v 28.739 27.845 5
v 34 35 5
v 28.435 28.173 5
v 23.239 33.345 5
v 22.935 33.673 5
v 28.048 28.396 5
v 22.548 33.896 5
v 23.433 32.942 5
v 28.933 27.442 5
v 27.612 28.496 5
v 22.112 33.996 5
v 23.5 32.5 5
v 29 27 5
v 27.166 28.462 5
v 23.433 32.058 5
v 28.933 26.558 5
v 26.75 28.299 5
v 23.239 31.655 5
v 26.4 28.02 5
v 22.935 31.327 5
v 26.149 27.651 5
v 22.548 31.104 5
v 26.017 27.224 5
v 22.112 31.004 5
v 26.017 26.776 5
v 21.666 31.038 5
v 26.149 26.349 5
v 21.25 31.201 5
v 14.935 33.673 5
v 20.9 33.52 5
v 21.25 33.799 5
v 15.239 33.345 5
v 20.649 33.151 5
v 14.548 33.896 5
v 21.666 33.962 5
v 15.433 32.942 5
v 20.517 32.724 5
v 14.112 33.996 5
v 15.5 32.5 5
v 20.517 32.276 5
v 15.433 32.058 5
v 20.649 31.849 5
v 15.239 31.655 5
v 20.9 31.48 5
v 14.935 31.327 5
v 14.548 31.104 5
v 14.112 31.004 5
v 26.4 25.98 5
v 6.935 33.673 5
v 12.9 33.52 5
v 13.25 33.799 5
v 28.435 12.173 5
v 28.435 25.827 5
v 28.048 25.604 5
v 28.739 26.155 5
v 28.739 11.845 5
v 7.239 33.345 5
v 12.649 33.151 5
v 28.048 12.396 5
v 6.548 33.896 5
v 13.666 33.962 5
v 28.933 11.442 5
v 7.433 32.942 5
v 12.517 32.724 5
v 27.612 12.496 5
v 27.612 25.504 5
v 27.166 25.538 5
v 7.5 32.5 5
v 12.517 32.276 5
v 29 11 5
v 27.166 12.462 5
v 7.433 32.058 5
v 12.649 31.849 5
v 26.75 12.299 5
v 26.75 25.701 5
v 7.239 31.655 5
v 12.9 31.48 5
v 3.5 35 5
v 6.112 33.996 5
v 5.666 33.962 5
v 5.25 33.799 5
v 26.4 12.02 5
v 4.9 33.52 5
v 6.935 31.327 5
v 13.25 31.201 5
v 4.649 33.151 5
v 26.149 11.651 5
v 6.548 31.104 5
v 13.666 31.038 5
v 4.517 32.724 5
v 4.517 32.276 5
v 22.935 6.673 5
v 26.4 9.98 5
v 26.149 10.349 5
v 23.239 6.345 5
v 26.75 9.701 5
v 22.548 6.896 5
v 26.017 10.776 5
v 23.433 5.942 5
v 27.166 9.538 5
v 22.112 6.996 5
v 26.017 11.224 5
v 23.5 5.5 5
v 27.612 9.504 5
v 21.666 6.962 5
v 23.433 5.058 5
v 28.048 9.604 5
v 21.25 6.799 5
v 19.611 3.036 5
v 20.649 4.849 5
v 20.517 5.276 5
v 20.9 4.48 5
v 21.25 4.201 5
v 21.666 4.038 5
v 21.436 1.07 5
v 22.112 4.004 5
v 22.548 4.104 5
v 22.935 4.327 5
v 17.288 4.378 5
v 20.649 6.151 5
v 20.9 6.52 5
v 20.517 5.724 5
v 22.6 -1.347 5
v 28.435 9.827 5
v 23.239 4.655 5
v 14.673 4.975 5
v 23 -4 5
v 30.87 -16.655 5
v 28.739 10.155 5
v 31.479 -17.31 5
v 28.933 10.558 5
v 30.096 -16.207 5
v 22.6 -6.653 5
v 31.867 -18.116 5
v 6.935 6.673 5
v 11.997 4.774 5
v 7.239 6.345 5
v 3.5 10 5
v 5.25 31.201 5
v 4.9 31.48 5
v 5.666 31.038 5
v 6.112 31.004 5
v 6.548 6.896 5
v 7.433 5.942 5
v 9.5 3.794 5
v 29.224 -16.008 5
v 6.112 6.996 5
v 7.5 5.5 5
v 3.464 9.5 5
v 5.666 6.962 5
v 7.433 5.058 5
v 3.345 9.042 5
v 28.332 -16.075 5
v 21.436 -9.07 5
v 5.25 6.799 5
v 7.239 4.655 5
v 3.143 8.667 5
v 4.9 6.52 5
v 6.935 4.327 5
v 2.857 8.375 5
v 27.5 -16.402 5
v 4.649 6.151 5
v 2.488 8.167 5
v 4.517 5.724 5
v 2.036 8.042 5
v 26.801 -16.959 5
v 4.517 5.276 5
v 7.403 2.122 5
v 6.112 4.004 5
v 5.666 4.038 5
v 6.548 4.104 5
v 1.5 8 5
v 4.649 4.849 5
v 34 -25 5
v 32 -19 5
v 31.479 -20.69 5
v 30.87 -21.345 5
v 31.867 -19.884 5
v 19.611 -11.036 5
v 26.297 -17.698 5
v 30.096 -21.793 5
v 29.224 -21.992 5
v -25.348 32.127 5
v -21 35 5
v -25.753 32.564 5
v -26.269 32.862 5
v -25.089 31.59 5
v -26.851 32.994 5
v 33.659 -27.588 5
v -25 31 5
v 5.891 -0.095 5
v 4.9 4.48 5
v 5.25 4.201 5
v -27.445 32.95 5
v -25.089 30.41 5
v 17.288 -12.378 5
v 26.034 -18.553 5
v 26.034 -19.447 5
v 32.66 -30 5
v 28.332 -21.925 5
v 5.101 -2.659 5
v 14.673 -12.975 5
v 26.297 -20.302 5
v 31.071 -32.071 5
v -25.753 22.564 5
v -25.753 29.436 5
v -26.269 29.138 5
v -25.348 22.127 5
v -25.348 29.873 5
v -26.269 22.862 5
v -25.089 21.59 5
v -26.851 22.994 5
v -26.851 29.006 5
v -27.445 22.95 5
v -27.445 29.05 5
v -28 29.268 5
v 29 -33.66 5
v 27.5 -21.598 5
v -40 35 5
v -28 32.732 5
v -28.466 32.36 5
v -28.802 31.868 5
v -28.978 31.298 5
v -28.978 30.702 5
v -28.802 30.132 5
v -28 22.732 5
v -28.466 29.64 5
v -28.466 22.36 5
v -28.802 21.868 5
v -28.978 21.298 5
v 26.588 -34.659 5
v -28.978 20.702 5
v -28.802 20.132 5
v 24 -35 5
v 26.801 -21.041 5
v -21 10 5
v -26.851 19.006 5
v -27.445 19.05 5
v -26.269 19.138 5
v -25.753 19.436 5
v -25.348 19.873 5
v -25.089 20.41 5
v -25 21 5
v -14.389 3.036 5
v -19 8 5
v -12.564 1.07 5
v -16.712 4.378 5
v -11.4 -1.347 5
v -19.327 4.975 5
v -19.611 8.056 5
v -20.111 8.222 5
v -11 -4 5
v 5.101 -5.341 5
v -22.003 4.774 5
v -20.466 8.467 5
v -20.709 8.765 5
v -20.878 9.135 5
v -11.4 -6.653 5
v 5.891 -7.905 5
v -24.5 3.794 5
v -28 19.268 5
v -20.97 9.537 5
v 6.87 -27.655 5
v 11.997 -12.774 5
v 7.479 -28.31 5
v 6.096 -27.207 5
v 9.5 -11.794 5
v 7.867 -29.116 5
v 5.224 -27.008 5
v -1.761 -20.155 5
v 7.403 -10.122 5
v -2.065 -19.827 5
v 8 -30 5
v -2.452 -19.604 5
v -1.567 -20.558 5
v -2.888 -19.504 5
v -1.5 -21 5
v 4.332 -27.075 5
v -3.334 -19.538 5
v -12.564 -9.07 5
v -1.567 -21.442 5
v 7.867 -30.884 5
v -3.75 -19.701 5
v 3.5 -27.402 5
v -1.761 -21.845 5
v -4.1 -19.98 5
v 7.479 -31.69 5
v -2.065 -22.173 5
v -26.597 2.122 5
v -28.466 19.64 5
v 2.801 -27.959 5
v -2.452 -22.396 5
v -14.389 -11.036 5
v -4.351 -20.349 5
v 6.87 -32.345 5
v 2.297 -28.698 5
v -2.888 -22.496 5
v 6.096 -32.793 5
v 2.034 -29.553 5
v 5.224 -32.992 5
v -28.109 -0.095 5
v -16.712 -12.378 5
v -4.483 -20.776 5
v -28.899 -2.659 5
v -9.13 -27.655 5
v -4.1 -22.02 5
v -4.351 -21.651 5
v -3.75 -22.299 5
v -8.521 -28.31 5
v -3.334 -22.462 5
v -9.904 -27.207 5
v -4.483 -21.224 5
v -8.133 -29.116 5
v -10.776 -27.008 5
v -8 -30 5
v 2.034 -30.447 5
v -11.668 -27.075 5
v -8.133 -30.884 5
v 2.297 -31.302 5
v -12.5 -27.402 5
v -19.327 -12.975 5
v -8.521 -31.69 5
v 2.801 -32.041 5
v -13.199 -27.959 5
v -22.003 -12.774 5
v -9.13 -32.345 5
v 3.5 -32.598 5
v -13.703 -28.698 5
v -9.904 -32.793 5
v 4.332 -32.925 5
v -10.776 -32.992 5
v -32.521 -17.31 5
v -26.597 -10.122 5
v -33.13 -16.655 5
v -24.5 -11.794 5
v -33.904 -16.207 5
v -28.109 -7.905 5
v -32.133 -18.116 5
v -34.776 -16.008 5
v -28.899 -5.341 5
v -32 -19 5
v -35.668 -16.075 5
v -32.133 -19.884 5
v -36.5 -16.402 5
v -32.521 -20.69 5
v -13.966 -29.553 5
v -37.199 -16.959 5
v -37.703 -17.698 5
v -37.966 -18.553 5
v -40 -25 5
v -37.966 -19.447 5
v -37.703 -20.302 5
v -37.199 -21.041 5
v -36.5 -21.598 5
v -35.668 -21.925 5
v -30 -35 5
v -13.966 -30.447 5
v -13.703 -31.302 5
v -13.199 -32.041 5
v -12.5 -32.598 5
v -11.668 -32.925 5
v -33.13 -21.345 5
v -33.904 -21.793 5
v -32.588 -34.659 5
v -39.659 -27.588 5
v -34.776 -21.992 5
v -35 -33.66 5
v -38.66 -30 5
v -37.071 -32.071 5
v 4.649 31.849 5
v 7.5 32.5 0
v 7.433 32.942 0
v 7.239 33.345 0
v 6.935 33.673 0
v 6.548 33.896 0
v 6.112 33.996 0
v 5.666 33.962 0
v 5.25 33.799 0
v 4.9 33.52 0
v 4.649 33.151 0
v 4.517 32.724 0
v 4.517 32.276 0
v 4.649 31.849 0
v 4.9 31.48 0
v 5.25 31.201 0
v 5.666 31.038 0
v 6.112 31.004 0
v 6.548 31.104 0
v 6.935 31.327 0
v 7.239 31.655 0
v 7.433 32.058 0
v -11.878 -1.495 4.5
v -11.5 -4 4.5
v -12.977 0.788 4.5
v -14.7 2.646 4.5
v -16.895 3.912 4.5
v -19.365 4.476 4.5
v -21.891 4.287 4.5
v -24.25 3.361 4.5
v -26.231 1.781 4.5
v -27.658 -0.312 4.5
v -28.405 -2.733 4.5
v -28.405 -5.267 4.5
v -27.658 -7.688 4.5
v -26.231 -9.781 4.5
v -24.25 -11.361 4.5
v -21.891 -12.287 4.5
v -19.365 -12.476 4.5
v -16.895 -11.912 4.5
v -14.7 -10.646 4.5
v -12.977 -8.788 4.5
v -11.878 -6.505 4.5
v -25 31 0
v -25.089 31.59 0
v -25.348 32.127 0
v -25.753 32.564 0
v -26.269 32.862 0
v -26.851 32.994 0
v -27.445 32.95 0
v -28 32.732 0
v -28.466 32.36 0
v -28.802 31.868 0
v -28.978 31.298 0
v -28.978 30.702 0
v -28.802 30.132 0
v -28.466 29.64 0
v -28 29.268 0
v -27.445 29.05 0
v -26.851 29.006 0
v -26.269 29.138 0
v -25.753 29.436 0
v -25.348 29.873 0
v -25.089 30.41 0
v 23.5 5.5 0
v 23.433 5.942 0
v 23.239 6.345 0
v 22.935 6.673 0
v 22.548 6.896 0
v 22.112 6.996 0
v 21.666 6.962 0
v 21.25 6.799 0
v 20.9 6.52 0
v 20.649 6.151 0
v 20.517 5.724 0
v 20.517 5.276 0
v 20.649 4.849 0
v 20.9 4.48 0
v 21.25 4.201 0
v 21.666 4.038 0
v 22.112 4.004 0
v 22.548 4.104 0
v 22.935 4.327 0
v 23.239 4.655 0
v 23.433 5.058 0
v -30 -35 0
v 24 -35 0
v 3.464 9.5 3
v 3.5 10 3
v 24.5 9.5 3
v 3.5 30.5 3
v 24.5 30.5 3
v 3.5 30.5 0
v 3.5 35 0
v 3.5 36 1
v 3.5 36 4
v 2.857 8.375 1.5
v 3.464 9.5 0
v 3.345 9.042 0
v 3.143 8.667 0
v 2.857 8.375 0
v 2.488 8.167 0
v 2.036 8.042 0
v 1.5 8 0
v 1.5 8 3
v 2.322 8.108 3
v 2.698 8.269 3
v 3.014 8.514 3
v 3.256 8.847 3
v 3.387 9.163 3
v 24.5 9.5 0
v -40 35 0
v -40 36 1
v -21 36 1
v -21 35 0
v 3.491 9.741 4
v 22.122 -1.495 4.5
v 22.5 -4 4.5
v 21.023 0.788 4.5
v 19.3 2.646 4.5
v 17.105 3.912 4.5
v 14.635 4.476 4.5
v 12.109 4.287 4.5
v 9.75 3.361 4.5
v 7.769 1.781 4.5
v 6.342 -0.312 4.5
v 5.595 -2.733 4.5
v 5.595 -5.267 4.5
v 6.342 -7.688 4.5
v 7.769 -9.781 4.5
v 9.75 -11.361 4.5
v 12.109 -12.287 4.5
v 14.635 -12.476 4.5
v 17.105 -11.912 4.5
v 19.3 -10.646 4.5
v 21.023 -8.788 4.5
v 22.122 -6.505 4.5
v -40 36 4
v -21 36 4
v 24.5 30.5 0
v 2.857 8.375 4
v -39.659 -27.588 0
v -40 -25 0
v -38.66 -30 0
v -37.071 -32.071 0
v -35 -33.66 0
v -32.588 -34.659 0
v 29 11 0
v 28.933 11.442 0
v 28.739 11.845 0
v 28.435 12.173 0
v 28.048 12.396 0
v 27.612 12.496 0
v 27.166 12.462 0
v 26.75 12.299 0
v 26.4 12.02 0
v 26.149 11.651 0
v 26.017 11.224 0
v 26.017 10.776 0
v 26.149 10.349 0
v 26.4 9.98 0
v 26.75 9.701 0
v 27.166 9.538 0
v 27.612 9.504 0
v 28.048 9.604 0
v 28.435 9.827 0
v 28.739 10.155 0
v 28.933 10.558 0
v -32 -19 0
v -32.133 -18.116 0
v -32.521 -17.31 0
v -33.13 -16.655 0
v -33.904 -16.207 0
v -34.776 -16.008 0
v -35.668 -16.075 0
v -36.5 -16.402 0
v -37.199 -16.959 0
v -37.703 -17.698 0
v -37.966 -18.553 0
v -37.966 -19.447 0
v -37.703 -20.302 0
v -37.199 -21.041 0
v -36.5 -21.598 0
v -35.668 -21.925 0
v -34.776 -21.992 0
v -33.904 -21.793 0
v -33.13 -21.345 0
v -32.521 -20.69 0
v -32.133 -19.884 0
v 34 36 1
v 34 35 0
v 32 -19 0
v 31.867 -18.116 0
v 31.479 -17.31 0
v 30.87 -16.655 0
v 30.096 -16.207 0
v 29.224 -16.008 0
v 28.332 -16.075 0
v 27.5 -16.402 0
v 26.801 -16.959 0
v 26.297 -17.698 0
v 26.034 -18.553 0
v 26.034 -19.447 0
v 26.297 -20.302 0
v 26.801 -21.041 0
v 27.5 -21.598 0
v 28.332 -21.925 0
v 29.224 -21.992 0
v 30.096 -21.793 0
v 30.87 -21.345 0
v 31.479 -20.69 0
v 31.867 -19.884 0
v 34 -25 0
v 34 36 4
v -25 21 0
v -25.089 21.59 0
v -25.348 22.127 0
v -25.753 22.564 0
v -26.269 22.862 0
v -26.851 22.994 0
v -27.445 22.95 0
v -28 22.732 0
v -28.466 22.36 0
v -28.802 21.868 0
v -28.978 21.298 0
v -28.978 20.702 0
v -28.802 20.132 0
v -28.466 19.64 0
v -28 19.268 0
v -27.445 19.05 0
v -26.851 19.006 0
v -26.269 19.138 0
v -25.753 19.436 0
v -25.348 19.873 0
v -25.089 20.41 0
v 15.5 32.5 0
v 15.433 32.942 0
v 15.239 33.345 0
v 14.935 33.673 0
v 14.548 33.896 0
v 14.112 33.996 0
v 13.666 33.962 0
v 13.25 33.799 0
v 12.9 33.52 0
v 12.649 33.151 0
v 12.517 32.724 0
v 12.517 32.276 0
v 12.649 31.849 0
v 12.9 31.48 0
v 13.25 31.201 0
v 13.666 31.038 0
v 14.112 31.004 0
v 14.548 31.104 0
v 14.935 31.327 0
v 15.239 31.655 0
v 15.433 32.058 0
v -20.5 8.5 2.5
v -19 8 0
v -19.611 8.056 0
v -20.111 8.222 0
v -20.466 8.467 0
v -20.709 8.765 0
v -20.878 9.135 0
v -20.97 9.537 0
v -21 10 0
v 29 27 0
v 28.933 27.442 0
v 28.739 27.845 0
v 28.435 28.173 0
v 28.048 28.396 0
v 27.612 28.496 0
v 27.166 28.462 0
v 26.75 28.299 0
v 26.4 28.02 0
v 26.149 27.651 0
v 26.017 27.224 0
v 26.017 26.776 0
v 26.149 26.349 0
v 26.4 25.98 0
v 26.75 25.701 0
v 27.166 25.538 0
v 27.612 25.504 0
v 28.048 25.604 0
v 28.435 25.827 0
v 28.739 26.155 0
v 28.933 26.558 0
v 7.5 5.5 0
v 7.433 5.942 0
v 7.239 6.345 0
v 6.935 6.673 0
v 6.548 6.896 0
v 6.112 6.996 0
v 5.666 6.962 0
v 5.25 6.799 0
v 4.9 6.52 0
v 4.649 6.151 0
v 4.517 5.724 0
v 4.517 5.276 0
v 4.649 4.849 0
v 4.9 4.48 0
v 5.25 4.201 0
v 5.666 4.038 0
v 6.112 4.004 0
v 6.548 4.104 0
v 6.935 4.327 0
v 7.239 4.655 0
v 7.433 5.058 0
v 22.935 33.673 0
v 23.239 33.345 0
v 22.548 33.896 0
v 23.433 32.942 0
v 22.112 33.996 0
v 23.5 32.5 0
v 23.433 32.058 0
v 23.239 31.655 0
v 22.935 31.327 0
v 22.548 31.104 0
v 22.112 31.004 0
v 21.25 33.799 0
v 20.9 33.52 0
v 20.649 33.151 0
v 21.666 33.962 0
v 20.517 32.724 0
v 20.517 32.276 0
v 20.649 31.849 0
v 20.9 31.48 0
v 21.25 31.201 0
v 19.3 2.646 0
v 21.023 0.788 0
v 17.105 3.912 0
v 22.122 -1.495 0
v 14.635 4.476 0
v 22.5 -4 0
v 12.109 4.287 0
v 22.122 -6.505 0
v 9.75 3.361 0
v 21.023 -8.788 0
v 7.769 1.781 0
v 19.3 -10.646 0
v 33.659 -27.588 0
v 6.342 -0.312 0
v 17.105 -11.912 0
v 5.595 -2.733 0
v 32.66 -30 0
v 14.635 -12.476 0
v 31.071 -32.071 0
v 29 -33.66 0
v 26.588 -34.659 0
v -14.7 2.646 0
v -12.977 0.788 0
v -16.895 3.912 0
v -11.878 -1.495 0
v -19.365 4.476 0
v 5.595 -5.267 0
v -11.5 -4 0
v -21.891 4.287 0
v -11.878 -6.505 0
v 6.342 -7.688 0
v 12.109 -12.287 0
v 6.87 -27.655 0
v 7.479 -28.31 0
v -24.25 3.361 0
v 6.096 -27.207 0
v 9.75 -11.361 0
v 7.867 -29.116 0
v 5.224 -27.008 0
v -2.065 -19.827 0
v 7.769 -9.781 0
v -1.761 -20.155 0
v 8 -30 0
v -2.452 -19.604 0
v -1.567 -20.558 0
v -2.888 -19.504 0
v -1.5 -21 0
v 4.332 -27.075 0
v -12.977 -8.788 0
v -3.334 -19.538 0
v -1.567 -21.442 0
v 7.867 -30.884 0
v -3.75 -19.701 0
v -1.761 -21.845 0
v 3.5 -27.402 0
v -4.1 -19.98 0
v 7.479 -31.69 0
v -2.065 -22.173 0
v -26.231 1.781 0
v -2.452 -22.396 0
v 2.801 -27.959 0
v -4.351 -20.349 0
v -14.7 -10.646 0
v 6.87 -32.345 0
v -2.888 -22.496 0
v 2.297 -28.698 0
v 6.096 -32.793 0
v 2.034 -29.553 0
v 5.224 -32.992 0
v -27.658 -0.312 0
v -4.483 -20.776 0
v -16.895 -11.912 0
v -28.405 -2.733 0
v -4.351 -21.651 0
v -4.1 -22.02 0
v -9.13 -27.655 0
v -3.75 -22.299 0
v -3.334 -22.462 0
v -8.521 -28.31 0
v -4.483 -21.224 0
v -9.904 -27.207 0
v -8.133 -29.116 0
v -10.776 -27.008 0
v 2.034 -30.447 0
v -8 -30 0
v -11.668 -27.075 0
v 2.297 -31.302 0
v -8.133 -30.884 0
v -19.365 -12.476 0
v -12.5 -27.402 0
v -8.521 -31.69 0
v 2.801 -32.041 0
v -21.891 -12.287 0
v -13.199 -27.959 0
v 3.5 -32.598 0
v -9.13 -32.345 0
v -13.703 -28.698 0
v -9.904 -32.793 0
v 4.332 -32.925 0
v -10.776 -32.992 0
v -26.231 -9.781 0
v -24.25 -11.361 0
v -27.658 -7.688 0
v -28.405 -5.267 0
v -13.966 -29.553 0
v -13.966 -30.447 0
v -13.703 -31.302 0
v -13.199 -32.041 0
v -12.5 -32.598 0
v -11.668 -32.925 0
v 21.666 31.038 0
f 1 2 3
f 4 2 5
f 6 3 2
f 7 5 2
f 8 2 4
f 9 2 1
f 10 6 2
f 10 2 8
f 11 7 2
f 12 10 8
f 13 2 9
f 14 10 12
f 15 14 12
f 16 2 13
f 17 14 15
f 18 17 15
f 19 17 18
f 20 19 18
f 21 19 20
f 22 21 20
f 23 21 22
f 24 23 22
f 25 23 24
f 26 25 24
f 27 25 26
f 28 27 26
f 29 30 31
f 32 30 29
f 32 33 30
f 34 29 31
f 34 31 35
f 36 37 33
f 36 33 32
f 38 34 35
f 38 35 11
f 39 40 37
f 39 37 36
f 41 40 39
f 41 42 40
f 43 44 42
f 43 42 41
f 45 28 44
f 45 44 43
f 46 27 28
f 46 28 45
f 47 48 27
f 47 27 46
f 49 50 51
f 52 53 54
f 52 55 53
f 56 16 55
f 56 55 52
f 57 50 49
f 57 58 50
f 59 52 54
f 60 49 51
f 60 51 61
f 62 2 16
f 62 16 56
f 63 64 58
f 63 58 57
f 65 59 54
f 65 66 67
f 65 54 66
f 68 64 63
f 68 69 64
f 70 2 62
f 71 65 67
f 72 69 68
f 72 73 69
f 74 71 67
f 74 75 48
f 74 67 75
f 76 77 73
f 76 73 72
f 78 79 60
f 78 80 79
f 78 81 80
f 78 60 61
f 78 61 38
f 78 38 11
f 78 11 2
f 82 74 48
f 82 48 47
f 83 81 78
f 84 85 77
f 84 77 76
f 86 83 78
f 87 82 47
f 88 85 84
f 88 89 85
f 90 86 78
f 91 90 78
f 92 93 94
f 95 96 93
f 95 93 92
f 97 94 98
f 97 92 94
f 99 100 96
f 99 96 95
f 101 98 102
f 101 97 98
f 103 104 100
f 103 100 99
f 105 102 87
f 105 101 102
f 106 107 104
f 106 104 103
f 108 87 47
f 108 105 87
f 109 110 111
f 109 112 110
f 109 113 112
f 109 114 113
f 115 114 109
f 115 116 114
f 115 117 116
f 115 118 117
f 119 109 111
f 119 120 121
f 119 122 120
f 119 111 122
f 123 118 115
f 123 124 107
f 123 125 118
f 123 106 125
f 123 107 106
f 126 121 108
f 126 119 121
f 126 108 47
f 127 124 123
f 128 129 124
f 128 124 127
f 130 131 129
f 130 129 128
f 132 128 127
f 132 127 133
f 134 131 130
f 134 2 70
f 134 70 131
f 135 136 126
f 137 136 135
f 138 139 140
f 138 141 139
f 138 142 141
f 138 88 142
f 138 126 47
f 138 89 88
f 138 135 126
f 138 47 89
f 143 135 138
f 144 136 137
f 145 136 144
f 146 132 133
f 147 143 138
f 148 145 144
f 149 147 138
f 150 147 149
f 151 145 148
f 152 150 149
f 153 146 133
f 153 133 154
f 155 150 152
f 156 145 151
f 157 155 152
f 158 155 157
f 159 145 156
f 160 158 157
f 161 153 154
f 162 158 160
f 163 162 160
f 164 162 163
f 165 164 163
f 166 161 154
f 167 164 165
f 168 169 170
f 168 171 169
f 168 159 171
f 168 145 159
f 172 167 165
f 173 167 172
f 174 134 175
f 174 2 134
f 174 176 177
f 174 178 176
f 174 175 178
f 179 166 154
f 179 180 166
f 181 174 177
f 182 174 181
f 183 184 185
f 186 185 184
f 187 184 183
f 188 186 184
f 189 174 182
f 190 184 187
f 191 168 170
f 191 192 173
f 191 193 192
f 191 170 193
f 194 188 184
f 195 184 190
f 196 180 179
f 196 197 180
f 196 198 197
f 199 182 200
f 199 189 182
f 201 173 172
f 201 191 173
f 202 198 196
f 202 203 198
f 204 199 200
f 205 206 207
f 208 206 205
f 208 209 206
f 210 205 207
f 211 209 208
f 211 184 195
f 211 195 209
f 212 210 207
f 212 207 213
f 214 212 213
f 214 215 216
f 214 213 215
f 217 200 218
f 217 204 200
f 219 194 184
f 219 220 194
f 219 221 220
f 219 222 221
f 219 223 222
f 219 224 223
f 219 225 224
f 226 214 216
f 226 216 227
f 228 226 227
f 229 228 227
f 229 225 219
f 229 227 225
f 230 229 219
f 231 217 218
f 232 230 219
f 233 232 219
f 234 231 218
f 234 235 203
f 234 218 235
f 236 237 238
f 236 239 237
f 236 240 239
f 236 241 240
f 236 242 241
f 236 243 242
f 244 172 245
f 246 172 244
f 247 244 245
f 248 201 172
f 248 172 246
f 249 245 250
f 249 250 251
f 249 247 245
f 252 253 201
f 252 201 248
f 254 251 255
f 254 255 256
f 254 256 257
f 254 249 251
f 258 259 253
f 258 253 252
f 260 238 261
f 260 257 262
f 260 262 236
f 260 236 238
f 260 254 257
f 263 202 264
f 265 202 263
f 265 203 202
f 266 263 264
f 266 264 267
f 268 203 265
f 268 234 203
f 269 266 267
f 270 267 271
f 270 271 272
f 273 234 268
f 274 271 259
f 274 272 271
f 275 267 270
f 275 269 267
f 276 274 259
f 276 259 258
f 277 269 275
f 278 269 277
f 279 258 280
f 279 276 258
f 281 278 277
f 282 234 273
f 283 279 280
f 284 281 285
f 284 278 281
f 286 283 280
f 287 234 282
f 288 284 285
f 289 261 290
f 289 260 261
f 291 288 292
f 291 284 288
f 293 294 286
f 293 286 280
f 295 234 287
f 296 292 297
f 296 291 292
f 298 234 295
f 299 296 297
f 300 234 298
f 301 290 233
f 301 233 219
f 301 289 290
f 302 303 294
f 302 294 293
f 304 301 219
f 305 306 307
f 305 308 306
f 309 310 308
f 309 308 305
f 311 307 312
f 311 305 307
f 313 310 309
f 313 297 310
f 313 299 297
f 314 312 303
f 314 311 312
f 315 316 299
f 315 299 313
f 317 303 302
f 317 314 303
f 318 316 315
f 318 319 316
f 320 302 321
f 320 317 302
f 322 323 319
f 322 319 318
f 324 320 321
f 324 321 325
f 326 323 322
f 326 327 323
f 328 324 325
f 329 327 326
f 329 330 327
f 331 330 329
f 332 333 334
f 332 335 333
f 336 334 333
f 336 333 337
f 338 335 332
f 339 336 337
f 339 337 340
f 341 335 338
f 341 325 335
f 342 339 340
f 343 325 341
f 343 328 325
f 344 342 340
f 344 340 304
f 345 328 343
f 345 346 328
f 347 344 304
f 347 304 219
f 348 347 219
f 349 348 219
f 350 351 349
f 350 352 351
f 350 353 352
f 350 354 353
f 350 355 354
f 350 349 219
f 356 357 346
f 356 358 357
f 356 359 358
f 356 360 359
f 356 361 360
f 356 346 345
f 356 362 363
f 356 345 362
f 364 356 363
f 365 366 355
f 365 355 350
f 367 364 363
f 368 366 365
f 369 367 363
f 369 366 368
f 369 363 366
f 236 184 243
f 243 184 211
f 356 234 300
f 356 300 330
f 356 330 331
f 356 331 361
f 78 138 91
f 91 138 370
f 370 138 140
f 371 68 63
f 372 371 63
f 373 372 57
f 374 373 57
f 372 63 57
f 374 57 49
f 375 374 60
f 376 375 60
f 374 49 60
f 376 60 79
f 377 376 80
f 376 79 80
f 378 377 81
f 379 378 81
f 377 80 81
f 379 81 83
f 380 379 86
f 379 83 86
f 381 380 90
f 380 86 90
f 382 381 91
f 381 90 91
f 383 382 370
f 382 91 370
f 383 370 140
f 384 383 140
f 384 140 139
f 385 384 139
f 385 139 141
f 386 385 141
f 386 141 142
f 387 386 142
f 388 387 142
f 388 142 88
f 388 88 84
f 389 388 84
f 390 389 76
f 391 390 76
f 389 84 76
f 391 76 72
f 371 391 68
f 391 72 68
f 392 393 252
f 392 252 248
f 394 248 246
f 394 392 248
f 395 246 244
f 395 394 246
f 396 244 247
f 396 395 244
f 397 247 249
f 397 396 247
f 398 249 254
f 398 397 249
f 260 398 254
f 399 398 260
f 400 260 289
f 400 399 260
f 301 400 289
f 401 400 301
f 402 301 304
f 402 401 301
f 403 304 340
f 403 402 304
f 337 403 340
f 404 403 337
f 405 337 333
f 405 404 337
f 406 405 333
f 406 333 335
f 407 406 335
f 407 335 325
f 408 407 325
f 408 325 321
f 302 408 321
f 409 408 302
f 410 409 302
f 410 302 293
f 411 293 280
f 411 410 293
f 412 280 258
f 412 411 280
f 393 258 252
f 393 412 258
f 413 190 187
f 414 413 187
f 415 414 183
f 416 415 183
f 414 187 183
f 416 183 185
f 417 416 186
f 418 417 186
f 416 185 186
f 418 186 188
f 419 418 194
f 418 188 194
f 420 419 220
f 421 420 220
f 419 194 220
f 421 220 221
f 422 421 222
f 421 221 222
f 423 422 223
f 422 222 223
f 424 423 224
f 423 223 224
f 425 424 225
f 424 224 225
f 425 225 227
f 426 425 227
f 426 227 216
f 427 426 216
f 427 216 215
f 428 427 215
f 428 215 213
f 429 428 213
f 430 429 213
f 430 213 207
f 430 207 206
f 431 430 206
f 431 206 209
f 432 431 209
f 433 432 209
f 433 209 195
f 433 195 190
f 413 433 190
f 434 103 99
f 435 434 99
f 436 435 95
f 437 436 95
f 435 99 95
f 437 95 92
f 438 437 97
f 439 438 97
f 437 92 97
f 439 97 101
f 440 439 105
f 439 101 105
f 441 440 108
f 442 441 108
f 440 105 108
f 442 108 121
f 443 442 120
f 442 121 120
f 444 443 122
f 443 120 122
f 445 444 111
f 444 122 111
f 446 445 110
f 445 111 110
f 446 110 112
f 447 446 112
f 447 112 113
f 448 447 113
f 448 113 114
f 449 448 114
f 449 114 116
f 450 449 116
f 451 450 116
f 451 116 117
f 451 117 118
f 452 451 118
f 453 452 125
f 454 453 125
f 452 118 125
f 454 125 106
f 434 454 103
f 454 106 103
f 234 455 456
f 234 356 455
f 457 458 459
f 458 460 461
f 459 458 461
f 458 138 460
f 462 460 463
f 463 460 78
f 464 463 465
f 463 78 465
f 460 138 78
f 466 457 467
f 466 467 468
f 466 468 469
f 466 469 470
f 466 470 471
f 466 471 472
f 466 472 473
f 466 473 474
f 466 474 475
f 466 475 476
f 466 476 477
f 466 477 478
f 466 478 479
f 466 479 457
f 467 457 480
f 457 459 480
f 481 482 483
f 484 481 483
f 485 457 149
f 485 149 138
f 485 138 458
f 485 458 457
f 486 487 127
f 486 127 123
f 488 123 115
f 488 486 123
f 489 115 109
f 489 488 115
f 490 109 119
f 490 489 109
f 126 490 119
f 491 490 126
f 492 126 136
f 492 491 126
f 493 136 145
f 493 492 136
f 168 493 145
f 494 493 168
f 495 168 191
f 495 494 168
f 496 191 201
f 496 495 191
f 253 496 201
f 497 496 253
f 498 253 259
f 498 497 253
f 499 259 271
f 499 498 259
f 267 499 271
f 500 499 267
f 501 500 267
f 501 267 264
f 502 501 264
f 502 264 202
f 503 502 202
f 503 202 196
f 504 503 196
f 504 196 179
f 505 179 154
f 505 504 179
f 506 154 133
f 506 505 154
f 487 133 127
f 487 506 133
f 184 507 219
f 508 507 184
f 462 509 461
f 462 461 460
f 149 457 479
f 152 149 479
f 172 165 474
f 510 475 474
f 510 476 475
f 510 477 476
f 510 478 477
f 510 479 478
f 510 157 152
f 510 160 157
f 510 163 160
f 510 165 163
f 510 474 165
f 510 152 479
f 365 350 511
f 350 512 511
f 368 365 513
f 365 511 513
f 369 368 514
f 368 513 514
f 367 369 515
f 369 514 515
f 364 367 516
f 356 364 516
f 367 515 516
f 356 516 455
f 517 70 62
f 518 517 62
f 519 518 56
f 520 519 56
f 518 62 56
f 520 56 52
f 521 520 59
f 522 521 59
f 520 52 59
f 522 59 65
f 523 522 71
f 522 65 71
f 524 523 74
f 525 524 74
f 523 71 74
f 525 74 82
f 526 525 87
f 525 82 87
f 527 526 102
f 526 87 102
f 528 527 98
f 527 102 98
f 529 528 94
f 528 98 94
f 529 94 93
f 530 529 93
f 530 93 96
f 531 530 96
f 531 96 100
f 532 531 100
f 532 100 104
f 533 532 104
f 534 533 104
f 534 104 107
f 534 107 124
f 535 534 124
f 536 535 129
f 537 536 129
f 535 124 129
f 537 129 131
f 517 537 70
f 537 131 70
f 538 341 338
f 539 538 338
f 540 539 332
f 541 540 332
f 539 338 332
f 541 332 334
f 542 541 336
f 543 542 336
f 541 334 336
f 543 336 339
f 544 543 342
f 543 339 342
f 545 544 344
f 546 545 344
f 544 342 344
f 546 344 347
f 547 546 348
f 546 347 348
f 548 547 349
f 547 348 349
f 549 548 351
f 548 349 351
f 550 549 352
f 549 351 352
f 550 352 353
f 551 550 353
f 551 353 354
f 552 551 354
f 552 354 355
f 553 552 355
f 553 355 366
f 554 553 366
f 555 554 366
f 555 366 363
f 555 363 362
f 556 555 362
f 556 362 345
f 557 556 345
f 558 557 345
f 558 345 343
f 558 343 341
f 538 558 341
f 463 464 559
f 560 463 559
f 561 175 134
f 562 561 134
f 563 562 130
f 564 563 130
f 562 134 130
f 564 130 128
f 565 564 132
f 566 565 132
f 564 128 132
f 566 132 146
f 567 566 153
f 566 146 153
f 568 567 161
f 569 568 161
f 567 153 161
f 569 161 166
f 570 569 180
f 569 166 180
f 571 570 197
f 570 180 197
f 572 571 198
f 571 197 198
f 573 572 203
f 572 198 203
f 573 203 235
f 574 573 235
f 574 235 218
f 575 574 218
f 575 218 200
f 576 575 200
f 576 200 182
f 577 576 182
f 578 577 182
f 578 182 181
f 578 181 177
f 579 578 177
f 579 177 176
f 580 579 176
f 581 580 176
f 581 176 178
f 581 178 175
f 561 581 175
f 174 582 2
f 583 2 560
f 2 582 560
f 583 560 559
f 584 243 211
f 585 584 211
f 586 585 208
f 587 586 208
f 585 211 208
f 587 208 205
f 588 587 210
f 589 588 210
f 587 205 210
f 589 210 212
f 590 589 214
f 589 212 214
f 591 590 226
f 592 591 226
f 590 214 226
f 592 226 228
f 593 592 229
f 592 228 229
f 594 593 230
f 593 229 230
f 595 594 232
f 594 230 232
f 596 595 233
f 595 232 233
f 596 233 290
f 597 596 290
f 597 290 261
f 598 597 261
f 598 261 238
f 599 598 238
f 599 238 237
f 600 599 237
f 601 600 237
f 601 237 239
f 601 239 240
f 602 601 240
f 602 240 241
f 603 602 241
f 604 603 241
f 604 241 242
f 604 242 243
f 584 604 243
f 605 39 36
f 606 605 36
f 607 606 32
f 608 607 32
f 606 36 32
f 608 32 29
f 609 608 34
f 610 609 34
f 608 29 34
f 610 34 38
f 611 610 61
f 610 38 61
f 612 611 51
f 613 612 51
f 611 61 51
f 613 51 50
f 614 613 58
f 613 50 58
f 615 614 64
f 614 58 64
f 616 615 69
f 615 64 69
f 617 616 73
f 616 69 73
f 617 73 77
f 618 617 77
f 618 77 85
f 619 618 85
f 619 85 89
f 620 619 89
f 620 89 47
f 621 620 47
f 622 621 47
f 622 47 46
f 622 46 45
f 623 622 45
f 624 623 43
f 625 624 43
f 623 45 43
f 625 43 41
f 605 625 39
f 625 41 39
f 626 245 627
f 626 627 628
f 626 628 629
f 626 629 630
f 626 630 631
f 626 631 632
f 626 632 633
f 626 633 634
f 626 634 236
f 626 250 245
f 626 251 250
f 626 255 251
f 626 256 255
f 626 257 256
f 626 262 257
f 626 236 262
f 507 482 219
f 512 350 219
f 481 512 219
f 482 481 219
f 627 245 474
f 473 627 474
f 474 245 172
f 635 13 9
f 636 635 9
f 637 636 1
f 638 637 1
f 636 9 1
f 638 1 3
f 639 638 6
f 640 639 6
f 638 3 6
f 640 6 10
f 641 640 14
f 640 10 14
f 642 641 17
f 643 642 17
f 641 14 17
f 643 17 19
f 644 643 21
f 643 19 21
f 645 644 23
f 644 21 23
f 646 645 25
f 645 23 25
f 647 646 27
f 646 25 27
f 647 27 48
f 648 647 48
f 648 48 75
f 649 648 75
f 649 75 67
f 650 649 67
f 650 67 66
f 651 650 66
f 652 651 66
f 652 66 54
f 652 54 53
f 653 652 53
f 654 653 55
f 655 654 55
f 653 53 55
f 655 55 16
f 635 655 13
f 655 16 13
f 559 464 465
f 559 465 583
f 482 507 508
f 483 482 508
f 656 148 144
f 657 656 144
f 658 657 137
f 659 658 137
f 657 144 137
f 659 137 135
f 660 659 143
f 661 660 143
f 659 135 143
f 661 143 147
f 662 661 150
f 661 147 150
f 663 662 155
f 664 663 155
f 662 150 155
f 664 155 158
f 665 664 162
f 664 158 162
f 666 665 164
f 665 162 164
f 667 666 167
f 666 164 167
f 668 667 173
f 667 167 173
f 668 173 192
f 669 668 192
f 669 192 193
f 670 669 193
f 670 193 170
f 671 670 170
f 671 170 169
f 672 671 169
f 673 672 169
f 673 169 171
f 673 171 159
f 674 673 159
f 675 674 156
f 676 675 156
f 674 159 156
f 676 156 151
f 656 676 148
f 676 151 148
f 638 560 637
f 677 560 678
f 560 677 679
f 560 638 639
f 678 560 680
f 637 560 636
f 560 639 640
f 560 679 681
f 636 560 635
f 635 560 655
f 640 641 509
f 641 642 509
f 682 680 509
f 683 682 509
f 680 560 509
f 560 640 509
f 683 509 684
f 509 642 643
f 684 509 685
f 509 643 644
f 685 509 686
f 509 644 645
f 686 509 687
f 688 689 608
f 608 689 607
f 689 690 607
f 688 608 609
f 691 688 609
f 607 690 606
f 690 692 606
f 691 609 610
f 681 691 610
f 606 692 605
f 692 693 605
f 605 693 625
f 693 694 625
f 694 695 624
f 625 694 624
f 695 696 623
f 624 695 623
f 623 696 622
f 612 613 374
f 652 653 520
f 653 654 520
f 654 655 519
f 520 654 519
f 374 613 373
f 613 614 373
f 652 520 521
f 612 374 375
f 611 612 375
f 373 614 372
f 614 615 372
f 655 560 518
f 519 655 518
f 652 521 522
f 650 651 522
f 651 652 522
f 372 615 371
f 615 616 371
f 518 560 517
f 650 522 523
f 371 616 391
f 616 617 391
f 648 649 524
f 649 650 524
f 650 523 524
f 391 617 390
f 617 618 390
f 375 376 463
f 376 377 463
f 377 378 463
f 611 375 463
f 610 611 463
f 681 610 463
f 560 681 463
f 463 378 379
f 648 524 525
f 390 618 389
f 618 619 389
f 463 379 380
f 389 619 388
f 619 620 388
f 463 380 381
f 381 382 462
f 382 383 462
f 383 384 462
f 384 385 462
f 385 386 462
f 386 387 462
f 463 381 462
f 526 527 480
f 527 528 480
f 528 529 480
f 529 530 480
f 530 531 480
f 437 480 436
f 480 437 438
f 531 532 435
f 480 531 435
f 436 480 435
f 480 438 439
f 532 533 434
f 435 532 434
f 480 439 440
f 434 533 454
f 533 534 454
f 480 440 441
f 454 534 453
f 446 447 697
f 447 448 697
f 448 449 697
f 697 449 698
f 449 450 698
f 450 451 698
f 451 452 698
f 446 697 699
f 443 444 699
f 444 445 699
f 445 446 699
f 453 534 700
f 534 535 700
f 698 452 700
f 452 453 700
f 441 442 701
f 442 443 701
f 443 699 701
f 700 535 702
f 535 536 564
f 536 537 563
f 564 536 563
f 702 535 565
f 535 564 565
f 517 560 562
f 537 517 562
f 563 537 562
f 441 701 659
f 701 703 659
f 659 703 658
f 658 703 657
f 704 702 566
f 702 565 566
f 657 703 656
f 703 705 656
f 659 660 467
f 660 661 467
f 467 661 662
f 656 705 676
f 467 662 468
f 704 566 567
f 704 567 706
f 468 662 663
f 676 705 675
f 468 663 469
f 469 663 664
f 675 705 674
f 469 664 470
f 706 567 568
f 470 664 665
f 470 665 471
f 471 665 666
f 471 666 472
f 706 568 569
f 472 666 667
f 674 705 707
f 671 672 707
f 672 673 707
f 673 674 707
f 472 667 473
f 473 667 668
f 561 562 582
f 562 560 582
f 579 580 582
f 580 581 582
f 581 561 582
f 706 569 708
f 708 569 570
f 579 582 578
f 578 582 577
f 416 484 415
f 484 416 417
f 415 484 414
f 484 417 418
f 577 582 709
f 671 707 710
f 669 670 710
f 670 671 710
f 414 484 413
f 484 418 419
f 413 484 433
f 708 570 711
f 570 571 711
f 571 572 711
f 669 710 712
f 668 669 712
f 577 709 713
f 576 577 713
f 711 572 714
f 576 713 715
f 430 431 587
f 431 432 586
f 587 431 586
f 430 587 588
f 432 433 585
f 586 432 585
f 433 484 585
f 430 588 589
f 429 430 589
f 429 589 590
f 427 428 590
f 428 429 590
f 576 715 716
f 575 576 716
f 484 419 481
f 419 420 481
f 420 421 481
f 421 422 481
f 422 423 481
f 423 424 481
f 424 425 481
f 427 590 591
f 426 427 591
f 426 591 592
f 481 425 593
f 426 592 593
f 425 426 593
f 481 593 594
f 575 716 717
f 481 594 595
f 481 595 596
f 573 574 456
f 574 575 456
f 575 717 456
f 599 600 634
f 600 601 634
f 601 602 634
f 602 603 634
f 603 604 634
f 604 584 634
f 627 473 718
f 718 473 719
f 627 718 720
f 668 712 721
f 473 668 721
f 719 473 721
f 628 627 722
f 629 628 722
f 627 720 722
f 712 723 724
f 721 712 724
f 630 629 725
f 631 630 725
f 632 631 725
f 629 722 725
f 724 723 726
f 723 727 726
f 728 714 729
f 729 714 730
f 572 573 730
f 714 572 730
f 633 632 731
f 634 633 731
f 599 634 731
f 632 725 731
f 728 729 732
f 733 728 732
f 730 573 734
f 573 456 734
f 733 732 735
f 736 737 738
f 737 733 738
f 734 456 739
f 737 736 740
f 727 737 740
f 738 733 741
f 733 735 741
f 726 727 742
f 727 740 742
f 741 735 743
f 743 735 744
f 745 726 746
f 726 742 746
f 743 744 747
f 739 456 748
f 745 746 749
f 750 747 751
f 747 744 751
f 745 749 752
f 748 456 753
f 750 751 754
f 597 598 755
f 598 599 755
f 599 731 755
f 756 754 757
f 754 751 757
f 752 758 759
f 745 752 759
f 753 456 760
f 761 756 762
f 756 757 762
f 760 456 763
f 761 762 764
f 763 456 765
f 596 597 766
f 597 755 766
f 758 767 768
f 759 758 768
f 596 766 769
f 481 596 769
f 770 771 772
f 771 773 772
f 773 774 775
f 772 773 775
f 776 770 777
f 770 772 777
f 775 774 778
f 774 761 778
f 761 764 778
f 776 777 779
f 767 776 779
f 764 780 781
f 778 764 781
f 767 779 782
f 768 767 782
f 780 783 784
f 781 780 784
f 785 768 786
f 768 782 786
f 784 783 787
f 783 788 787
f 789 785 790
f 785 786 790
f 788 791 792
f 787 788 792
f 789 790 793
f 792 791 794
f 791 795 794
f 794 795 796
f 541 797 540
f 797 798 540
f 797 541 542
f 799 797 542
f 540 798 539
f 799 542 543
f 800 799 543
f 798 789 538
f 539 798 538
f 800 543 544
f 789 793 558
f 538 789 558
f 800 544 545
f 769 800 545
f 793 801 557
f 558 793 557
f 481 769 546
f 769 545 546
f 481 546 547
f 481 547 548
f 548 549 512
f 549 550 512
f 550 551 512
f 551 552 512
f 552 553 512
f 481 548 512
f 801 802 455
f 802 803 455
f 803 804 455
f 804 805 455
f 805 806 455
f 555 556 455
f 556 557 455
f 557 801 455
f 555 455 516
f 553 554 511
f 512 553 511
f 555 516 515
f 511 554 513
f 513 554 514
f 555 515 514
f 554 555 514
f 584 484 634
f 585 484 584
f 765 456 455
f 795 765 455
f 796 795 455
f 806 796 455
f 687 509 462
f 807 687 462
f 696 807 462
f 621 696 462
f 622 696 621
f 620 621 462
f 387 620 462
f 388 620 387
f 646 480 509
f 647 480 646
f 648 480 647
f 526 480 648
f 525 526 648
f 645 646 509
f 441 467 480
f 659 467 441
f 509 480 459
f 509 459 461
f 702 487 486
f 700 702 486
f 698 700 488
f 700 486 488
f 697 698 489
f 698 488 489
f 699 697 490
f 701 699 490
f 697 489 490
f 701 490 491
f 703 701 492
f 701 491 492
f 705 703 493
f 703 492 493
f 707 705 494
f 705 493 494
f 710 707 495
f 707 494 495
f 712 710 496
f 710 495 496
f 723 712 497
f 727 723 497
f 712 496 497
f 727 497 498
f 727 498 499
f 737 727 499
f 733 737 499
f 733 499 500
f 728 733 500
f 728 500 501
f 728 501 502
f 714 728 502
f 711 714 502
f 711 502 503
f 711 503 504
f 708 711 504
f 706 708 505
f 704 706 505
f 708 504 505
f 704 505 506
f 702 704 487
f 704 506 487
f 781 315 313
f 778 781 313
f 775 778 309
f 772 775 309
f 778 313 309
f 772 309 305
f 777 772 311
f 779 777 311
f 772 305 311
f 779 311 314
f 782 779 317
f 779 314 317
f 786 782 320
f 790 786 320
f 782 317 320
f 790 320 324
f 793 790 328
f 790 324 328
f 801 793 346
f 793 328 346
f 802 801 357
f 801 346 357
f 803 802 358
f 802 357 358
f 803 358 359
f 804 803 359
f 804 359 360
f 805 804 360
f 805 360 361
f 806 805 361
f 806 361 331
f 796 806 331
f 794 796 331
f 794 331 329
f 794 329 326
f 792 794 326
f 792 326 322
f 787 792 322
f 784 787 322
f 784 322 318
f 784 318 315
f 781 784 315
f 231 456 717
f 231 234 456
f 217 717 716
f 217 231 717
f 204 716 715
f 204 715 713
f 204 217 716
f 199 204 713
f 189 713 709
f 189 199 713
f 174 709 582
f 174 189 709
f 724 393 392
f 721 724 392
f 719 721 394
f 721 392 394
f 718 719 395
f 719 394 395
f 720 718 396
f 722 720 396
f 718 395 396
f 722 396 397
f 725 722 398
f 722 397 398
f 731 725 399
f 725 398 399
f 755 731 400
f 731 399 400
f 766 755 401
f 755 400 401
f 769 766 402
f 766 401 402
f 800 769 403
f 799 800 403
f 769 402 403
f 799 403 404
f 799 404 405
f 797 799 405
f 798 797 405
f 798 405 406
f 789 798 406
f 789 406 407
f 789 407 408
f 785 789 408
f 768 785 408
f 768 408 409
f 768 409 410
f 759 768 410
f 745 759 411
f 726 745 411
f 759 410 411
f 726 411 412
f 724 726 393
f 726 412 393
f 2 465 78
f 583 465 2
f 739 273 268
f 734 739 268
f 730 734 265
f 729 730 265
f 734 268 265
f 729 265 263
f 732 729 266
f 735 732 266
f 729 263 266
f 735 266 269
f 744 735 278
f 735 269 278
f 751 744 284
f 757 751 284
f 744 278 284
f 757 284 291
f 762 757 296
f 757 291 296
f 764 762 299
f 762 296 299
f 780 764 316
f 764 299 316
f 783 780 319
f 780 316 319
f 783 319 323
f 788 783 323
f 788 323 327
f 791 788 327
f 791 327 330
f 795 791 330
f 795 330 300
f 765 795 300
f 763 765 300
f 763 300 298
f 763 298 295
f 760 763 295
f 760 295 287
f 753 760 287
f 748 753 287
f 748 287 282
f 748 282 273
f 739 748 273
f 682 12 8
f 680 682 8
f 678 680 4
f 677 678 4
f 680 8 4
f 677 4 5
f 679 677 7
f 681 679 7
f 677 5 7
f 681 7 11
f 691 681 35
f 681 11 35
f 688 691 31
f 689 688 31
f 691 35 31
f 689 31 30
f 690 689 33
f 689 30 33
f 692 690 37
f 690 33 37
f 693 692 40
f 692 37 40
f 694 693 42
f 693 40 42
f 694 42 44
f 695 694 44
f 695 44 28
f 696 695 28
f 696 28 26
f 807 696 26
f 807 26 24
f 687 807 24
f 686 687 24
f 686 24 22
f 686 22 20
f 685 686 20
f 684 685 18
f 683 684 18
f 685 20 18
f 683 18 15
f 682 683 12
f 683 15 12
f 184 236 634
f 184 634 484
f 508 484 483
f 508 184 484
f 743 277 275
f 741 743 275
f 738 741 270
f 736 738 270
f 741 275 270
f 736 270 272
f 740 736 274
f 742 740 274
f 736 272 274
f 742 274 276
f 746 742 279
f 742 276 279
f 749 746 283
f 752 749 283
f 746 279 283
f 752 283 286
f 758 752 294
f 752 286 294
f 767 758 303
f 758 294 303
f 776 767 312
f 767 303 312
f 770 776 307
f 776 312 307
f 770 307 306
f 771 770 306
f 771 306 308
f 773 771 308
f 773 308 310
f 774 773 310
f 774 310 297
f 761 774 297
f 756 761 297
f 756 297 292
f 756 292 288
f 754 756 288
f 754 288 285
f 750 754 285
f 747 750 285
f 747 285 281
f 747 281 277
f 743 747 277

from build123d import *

# Parameters (mm, degrees)
SZKIC1_W                    = 54
SZKIC1_H                    = 71
DODANIE_WYCI_GNI_CIE1_DEPTH = 5
SZKIC2_W                    = 23.5
SZKIC2_H                    = 28
WYTNIJ_WYCI_GNI_CIE1_DEPTH  = 5
SZKIC3_W                    = 21
SZKIC3_H                    = 21
WYTNIJ_WYCI_GNI_CIE2_DEPTH  = 3
SZKIC4_R                    = 1.5
WYTNIJ_WYCI_GNI_CIE3_DEPTH  = 5
SZKIC5_W                    = 20
SZKIC5_H                    = 43
DODANIE_WYCI_GNI_CIE2_DEPTH = 5
SZKIC6_R                    = 8.5
WYTNIJ_WYCI_GNI_CIE4_DEPTH  = 5
SZKIC7_R                    = 3
WYTNIJ_WYCI_GNI_CIE5_DEPTH  = 10
ZAOKR_GLENIE3_R             = 10
SZKIC8_W                    = 19
SZKIC8_H                    = 28
DODANIE_WYCI_GNI_CIE3_DEPTH = 5
ZAOKR_GLENIE2_SIZE          = 2
SZKIC9_R                    = 2
WYTNIJ_WYCI_GNI_CIE6_DEPTH  = 10
SFAZOWANIE2_SIZE            = 1
SFAZOWANIE3_SIZE            = 0.5
SZKIC10_R                   = 1.5
WYTNIJ_WYCI_GNI_CIE7_DEPTH  = 10


with BuildPart() as part:
    # Szkic1 → Dodanie-wyciągnięcie1 (new body)
    with BuildSketch(Plane.XY):
        with Locations((7, 0.5)):
            Rectangle(SZKIC1_W, SZKIC1_H)
    extrude(amount=DODANIE_WYCI_GNI_CIE1_DEPTH)

    # Szkic2 → Wytnij-wyciągnięcie1 (cut)
    with BuildSketch(Plane.XY.offset(5)):
        with Locations((-8.25, 22)):
            Rectangle(SZKIC2_W, SZKIC2_H)
    extrude(amount=-WYTNIJ_WYCI_GNI_CIE1_DEPTH, mode=Mode.SUBTRACT)

    # Szkic3 → Wytnij-wyciągnięcie2 (cut)
    with BuildSketch(Plane(origin=(0, 0, 0), x_dir=(-1, 0, 0), z_dir=(0, 0, -1))):
        with Locations((-14, 20)):
            Rectangle(SZKIC3_W, SZKIC3_H)
    extrude(amount=-WYTNIJ_WYCI_GNI_CIE2_DEPTH, mode=Mode.SUBTRACT)

    # Szkic4 → Wytnij-wyciągnięcie3 (cut)
    with BuildSketch(Plane.XY.offset(5)):
        with Locations((6, 32.5)):
            Circle(SZKIC4_R)
        with Locations((14, 32.5)):
            Circle(SZKIC4_R)
        with Locations((22, 32.5)):
            Circle(SZKIC4_R)
        with Locations((22, 5.5)):
            Circle(SZKIC4_R)
        with Locations((6, 5.5)):
            Circle(SZKIC4_R)
        with Locations((27.5, 27)):
            Circle(SZKIC4_R)
        with Locations((27.5, 11)):
            Circle(SZKIC4_R)
    extrude(amount=-WYTNIJ_WYCI_GNI_CIE3_DEPTH, mode=Mode.SUBTRACT)

    # Szkic5 → Dodanie-wyciągnięcie2 (add)
    with BuildSketch(Plane.XY.offset(5)):
        with Locations((-30, -13.5)):
            Rectangle(SZKIC5_W, SZKIC5_H)
    extrude(amount=-DODANIE_WYCI_GNI_CIE2_DEPTH)

    # Szkic6 → Wytnij-wyciągnięcie4 (cut)
    with BuildSketch(Plane.XY.offset(5)):
        with Locations((-20, -4)):
            Circle(SZKIC6_R)
        with Locations((14, -4)):
            Circle(SZKIC6_R)
    extrude(amount=-WYTNIJ_WYCI_GNI_CIE4_DEPTH, mode=Mode.SUBTRACT)

    # Szkic7 → Wytnij-wyciągnięcie5 (cut)
    with BuildSketch(Plane.XY.offset(5)):
        with Locations((-11, -30)):
            Circle(SZKIC7_R)
        with Locations((5, -30)):
            Circle(SZKIC7_R)
        with Locations((-35, -19)):
            Circle(SZKIC7_R)
        with Locations((29, -19)):
            Circle(SZKIC7_R)
    extrude(amount=-WYTNIJ_WYCI_GNI_CIE5_DEPTH, mode=Mode.SUBTRACT)

    # Zaokrąglenie3
    zaokr_glenie3_edges = [part.edges().sort_by_distance(p)[0] for p in [
        (-40, -35, 2.5),
        (34, -35, 2.5),
    ]]
    fillet(zaokr_glenie3_edges, radius=ZAOKR_GLENIE3_R)

    # Szkic8 → Dodanie-wyciągnięcie3 (add)
    with BuildSketch(Plane.XY.offset(5)):
        with Locations((-30.5, 22)):
            Rectangle(SZKIC8_W, SZKIC8_H)
    extrude(amount=-DODANIE_WYCI_GNI_CIE3_DEPTH)

    # Zaokrąglenie2
    # a fillet whose section is not a circle: 2 mm, written as the material it adds along each edge
    with BuildSketch(Plane(origin=(3.5, 8, 5), x_dir=(0, 1, 0), z_dir=(0, 0, -1))) as zaokr_glenie2_piece_1_section:
        with BuildLine():
            Bezier((ZAOKR_GLENIE2_SIZE, 0), (0, 0), (0, -ZAOKR_GLENIE2_SIZE), weights=[1, 1, 1])
            Line((0, -ZAOKR_GLENIE2_SIZE), (0, 0))
            Line((0, 0), (ZAOKR_GLENIE2_SIZE, 0))
        make_face()
    zaokr_glenie2_piece_1 = extrude(amount=5, mode=Mode.PRIVATE)
    zaokr_glenie2_piece_1 = split(zaokr_glenie2_piece_1, bisect_by=Plane(origin=(3.5, 9.5, 5), z_dir=(0, 1, 0)), keep=Keep.TOP, mode=Mode.PRIVATE)
    zaokr_glenie2_piece_1 = split(zaokr_glenie2_piece_1, bisect_by=Plane(origin=(3.5, 8, 3), z_dir=(0, 0, 1)), keep=Keep.TOP, mode=Mode.PRIVATE)
    add(zaokr_glenie2_piece_1)
    with BuildSketch(Plane(origin=(3.5, 8, 5), x_dir=(0, 1, 0), z_dir=(0, 0, -1))) as zaokr_glenie2_piece_2_section:
        with BuildLine():
            Bezier((ZAOKR_GLENIE2_SIZE, 0), (0, 0), (0, -ZAOKR_GLENIE2_SIZE), weights=[1, 1, 1])
            Line((0, -ZAOKR_GLENIE2_SIZE), (0, 0))
            Line((0, 0), (ZAOKR_GLENIE2_SIZE, 0))
        make_face()
    zaokr_glenie2_piece_2 = extrude(amount=5, mode=Mode.PRIVATE)
    zaokr_glenie2_piece_2 = split(zaokr_glenie2_piece_2, bisect_by=Plane(origin=(3.5, 9.5, 5), z_dir=(0, -1, 0)), keep=Keep.TOP, mode=Mode.PRIVATE)
    zaokr_glenie2_piece_2 = split(zaokr_glenie2_piece_2, bisect_by=Plane(origin=(3.5, 8, 3), z_dir=(0, 0, 1)), keep=Keep.TOP, mode=Mode.PRIVATE)
    add(zaokr_glenie2_piece_2)
    with BuildSketch(Plane(origin=(3.5, 8, 5), x_dir=(0, 1, 0), z_dir=(0, 0, -1))) as zaokr_glenie2_piece_3_section:
        with BuildLine():
            Bezier((ZAOKR_GLENIE2_SIZE, 0), (0, 0), (0, -ZAOKR_GLENIE2_SIZE), weights=[1, 1, 1])
            Line((0, -ZAOKR_GLENIE2_SIZE), (0, 0))
            Line((0, 0), (ZAOKR_GLENIE2_SIZE, 0))
        make_face()
    zaokr_glenie2_piece_3 = extrude(amount=5, mode=Mode.PRIVATE)
    zaokr_glenie2_piece_3 = split(zaokr_glenie2_piece_3, bisect_by=Plane(origin=(3.5, 9.5, 5), z_dir=(0, -1, 0)), keep=Keep.TOP, mode=Mode.PRIVATE)
    zaokr_glenie2_piece_3 = split(zaokr_glenie2_piece_3, bisect_by=Plane(origin=(3.5, 8, 3), z_dir=(0, 0, -1)), keep=Keep.TOP, mode=Mode.PRIVATE)
    add(zaokr_glenie2_piece_3)
    with BuildSketch(Plane(origin=(-21, 8, 5), x_dir=(1, 0, 0), z_dir=(0, 0, -1))) as zaokr_glenie2_piece_4:
        with BuildLine():
            Bezier((ZAOKR_GLENIE2_SIZE, 0), (0, 0), (0, -ZAOKR_GLENIE2_SIZE), weights=[1, 1, 1])
            Line((0, -ZAOKR_GLENIE2_SIZE), (0, 0))
            Line((0, 0), (ZAOKR_GLENIE2_SIZE, 0))
        make_face()
    extrude(amount=5)

    # Szkic9 → Wytnij-wyciągnięcie6 (cut)
    with BuildSketch(Plane.XY.offset(5)):
        with Locations((-27, 31)):
            Circle(SZKIC9_R)
        with Locations((-27, 21)):
            Circle(SZKIC9_R)
    extrude(amount=-WYTNIJ_WYCI_GNI_CIE6_DEPTH, mode=Mode.SUBTRACT)

    # Sfazowanie2
    sfazowanie2_edges = [part.edges().sort_by_distance(p)[0] for p in [
        (-30.5, 36, 0),
        (-30.5, 36, 5),
        (18.75, 36, 5),
        (18.75, 36, 0),
    ]]
    chamfer(sfazowanie2_edges, length=SFAZOWANIE2_SIZE)

    # Sfazowanie3
    sfazowanie3_edges = [part.edges().sort_by_distance(p)[0] for p in [
        (-28.5, -4, 5),
        (5.5, -4, 5),
    ]]
    chamfer(sfazowanie3_edges, length=SFAZOWANIE3_SIZE)

    # Szkic10 → Wytnij-wyciągnięcie7 (cut)
    with BuildSketch(Plane.XY.offset(5)):
        with Locations((-3, -21)):
            Circle(SZKIC10_R)
    extrude(amount=-WYTNIJ_WYCI_GNI_CIE7_DEPTH, mode=Mode.SUBTRACT)


solid = part.part
